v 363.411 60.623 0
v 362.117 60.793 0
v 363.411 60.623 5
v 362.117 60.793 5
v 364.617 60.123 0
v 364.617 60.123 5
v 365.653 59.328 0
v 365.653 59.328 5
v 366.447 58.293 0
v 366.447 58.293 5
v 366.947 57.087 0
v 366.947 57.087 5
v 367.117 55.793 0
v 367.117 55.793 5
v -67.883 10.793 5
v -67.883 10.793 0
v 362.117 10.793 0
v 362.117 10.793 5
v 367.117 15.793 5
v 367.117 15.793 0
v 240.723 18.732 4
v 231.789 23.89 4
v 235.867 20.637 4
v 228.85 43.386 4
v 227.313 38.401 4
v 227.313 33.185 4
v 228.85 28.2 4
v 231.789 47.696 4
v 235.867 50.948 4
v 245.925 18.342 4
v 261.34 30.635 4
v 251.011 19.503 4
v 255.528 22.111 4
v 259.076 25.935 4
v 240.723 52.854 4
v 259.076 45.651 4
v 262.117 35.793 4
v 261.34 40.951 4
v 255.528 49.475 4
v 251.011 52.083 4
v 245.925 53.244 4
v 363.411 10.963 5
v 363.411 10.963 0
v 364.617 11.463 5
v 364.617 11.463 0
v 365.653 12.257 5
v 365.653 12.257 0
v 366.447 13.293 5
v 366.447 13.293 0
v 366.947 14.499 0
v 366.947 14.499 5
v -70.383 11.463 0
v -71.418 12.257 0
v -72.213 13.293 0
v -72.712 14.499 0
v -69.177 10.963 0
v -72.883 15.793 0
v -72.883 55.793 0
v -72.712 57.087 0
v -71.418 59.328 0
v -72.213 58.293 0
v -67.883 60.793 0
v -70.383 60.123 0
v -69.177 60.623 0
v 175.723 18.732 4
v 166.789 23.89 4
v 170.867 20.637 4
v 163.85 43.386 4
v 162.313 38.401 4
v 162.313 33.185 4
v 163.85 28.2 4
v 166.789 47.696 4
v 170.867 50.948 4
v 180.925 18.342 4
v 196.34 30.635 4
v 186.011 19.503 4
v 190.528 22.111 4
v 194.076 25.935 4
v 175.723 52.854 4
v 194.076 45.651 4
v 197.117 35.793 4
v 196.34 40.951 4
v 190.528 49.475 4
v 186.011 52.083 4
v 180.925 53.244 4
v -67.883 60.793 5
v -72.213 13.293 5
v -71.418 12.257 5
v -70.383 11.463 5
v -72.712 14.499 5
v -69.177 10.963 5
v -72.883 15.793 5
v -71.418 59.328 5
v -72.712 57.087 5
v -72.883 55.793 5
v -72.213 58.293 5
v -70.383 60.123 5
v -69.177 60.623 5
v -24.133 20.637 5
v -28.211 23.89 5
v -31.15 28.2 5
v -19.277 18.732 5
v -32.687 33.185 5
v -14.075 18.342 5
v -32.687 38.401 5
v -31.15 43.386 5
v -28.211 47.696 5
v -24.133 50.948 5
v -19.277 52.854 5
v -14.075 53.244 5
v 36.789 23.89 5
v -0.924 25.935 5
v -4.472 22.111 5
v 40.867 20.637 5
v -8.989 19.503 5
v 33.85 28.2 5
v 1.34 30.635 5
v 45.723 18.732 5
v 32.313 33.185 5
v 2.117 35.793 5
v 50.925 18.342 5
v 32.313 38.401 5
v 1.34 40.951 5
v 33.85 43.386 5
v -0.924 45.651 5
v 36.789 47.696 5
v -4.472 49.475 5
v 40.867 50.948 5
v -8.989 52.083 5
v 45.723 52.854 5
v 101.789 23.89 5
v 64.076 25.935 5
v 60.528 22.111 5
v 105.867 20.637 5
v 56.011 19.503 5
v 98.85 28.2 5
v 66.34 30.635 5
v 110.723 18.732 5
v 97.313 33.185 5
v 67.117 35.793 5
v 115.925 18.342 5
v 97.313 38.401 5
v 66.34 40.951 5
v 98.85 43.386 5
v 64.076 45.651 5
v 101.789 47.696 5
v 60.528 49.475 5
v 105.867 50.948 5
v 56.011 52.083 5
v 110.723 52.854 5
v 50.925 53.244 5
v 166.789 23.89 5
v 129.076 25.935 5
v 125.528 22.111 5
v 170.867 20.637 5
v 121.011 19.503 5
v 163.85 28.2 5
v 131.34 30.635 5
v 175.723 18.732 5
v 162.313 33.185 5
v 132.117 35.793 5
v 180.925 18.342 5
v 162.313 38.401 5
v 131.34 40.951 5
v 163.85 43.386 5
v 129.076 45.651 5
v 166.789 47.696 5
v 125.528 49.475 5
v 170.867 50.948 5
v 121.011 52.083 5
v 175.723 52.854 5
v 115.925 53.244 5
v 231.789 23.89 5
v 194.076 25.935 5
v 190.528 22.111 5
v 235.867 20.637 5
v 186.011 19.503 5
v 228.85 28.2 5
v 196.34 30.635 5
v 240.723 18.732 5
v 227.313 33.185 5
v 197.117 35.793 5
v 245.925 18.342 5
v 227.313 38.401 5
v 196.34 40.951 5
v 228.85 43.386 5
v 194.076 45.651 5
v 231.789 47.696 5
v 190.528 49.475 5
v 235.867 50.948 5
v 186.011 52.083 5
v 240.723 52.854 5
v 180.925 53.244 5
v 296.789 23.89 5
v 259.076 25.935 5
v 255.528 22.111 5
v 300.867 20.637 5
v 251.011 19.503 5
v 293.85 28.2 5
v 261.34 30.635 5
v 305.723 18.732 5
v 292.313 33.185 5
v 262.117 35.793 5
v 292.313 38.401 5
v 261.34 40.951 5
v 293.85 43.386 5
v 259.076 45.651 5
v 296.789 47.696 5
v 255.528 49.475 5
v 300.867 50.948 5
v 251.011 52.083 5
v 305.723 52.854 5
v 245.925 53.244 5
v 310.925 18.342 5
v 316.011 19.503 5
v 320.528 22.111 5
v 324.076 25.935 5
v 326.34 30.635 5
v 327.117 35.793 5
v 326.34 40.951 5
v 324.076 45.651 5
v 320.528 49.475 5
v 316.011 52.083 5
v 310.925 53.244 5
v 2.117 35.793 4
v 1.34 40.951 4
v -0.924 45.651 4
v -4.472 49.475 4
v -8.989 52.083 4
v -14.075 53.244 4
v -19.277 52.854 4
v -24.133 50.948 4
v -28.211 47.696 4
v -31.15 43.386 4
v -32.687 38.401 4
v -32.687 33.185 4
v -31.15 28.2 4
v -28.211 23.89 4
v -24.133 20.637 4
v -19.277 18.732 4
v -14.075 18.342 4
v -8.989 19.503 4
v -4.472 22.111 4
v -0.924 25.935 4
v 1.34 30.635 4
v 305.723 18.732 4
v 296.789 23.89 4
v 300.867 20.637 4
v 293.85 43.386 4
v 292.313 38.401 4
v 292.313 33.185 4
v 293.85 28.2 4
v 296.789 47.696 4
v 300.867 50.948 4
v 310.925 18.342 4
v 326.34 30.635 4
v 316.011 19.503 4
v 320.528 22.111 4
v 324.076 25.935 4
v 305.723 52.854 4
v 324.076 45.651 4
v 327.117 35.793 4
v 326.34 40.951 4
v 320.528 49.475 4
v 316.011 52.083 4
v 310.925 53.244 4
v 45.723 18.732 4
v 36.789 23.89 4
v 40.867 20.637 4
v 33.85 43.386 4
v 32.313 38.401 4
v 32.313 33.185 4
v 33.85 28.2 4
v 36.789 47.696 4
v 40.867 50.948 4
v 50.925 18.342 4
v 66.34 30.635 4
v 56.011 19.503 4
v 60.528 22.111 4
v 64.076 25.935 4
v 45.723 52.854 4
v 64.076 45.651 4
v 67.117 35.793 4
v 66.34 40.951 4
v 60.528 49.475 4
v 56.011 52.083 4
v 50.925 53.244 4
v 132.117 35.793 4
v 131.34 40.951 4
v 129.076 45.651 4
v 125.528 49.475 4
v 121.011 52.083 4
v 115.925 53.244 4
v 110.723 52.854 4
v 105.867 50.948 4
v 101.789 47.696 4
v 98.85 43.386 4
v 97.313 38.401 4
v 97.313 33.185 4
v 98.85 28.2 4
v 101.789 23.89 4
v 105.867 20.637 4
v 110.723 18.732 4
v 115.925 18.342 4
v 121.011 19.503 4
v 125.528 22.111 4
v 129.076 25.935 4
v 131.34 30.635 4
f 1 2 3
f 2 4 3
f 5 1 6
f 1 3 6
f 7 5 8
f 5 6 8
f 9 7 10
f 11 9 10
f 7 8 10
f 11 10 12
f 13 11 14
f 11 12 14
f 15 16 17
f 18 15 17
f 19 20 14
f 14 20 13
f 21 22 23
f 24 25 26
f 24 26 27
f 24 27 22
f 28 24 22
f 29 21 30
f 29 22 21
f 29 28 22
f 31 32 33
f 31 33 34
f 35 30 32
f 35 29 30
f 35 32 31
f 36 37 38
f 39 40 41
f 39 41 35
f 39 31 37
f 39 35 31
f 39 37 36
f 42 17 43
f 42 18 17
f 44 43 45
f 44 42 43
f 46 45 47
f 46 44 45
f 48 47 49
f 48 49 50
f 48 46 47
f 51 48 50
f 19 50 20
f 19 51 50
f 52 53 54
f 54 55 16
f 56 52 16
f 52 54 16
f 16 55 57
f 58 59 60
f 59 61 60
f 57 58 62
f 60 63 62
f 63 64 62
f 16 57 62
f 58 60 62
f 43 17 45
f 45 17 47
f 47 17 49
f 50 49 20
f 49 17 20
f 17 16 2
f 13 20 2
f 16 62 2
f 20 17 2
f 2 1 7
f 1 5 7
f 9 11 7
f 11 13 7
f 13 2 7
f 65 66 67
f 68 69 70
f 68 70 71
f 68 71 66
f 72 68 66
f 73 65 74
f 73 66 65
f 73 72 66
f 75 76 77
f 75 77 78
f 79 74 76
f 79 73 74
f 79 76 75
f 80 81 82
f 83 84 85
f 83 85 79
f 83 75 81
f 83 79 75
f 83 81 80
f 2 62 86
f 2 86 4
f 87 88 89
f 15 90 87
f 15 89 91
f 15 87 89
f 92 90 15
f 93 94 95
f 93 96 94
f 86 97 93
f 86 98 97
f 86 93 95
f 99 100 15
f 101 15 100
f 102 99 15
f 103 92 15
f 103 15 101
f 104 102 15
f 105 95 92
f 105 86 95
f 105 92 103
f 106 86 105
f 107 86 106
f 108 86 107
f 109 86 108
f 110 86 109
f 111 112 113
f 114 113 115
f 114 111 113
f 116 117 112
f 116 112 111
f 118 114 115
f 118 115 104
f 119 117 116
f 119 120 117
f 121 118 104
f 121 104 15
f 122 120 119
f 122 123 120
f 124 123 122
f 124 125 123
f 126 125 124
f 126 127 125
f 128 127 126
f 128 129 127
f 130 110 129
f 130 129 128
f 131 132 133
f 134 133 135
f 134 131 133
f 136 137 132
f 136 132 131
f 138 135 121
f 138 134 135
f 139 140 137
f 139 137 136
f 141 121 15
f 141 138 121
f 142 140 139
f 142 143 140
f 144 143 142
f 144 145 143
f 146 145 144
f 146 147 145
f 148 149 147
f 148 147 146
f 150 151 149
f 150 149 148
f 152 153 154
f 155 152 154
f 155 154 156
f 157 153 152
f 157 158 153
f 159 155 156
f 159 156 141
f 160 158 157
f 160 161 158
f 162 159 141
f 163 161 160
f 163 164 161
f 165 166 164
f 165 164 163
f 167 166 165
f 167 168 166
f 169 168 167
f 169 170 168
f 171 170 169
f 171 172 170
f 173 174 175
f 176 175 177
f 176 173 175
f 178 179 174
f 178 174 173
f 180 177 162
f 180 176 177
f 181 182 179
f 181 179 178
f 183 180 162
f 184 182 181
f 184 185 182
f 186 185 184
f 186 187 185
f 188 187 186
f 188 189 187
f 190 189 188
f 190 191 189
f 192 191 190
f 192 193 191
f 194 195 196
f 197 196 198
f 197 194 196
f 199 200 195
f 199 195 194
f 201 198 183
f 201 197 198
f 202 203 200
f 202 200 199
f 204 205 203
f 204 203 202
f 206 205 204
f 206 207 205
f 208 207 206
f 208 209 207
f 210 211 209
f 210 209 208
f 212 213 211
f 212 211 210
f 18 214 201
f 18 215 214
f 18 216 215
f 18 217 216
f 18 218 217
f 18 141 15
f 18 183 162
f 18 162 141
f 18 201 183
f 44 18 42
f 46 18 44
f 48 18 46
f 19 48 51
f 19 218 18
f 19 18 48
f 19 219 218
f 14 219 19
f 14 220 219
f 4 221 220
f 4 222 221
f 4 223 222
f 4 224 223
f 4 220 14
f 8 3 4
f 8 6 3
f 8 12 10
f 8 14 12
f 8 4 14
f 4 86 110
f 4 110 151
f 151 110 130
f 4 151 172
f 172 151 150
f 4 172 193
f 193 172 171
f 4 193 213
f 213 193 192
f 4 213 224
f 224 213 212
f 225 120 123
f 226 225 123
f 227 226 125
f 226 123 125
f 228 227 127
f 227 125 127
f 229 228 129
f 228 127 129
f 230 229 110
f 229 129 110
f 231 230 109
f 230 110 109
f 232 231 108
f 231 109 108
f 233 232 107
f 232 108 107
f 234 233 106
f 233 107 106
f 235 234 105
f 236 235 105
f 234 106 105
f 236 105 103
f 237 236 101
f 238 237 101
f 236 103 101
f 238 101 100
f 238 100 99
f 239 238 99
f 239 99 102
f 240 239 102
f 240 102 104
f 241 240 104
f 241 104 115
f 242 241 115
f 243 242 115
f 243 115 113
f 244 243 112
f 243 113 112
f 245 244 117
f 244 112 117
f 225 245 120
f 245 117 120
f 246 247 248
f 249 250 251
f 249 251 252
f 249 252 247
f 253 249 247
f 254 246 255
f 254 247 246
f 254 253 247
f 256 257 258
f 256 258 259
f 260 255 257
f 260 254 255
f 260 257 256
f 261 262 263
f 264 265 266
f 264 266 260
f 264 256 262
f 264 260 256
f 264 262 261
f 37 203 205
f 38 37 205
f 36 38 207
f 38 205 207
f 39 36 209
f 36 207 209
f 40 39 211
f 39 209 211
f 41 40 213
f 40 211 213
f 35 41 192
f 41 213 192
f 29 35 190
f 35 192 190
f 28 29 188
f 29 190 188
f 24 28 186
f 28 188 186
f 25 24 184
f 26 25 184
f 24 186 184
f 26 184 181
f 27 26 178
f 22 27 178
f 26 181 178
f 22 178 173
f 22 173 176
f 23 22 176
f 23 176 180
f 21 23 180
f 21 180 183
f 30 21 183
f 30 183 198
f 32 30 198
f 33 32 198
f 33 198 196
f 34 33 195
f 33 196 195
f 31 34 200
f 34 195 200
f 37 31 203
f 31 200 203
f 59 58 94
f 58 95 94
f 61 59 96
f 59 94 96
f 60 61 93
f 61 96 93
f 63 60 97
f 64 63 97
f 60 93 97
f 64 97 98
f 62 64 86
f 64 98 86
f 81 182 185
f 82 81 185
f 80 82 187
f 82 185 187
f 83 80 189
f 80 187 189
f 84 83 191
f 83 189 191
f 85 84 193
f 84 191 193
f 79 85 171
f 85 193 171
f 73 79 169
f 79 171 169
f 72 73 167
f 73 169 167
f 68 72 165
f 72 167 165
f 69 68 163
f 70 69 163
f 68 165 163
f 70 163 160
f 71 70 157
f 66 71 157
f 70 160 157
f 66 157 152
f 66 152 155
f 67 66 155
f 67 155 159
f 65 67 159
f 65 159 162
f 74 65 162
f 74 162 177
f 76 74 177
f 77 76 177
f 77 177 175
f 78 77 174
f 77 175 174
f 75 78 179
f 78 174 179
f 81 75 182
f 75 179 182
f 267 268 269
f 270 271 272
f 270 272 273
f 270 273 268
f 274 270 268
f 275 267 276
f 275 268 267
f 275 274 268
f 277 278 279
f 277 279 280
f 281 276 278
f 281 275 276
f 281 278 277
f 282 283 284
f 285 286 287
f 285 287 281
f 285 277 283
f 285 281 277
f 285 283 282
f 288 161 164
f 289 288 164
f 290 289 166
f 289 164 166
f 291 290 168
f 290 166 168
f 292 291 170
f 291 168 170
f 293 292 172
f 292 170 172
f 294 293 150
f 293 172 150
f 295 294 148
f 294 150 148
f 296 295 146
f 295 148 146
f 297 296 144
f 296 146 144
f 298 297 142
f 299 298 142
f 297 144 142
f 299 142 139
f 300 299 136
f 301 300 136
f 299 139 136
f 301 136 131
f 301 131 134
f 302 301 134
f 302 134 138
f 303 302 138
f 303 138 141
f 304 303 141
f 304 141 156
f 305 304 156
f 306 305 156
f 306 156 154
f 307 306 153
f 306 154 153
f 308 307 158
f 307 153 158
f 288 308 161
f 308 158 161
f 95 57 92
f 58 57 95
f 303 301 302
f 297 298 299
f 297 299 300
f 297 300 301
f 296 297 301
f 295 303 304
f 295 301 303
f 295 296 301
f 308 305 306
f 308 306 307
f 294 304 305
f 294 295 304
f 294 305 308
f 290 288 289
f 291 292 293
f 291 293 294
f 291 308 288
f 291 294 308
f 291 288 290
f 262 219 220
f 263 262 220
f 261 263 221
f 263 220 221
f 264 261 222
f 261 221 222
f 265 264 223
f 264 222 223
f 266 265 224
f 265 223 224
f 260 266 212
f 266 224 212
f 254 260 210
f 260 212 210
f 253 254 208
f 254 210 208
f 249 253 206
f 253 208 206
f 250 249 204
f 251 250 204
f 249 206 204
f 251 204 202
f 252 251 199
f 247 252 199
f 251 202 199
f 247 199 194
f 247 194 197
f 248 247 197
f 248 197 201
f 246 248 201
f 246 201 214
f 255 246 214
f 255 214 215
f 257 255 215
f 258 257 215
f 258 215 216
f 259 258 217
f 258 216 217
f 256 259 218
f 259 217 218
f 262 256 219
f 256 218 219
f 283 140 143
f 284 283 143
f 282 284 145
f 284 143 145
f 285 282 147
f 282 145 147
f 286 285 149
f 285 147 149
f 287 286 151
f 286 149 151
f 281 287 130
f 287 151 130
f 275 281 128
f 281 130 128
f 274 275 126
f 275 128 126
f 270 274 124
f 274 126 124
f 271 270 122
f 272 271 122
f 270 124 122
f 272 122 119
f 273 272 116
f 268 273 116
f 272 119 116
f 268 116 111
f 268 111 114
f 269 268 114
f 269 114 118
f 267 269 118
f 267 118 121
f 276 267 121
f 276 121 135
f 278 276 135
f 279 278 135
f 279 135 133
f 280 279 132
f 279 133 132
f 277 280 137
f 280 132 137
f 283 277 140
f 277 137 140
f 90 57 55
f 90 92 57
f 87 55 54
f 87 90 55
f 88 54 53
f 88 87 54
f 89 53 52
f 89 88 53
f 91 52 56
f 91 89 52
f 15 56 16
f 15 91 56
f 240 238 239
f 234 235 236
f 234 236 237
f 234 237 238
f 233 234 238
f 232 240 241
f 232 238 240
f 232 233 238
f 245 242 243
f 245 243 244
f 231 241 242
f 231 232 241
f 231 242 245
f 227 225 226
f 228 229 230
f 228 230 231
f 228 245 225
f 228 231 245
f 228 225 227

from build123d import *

# Parameters (mm, degrees)
SKETCH_W            = 440
SKETCH_H            = 50
PAD_DEPTH           = 5
SKETCH001_R         = 17.5
POCKET_DEPTH        = 1
FILLET_R            = 5
LINEARPATTERN_COUNT = 6
LINEARPATTERN_PITCH = 65


with BuildPart() as part:
    # Sketch → Pad (new body)
    with BuildSketch(Plane.XY):
        with Locations((147.117165, 35.792885)):
            Rectangle(SKETCH_W, SKETCH_H)
    extrude(amount=PAD_DEPTH)

    # Sketch001 (on Face6 of Pad) → Pocket (cut)
    with BuildSketch(Plane.XY.offset(5)):
        with Locations((-15.382835, 35.792885)):
            Circle(SKETCH001_R)
    pocket = extrude(amount=-POCKET_DEPTH, mode=Mode.SUBTRACT)

    # Fillet
    fillet_edges = [part.edges().sort_by_distance(p)[0] for p in [
        (-72.882835, 10.792885, 2.5),
        (367.117165, 10.792885, 2.5),
        (367.117165, 60.792885, 2.5),
        (-72.882835, 60.792885, 2.5),
    ]]
    fillet(fillet_edges, radius=FILLET_R)

    # LinearPattern: Pocket ×6
    with Locations(*[(i * LINEARPATTERN_PITCH, 0, 0) for i in range(1, LINEARPATTERN_COUNT)]):
        add(pocket, mode=Mode.SUBTRACT)


solid = part.part
